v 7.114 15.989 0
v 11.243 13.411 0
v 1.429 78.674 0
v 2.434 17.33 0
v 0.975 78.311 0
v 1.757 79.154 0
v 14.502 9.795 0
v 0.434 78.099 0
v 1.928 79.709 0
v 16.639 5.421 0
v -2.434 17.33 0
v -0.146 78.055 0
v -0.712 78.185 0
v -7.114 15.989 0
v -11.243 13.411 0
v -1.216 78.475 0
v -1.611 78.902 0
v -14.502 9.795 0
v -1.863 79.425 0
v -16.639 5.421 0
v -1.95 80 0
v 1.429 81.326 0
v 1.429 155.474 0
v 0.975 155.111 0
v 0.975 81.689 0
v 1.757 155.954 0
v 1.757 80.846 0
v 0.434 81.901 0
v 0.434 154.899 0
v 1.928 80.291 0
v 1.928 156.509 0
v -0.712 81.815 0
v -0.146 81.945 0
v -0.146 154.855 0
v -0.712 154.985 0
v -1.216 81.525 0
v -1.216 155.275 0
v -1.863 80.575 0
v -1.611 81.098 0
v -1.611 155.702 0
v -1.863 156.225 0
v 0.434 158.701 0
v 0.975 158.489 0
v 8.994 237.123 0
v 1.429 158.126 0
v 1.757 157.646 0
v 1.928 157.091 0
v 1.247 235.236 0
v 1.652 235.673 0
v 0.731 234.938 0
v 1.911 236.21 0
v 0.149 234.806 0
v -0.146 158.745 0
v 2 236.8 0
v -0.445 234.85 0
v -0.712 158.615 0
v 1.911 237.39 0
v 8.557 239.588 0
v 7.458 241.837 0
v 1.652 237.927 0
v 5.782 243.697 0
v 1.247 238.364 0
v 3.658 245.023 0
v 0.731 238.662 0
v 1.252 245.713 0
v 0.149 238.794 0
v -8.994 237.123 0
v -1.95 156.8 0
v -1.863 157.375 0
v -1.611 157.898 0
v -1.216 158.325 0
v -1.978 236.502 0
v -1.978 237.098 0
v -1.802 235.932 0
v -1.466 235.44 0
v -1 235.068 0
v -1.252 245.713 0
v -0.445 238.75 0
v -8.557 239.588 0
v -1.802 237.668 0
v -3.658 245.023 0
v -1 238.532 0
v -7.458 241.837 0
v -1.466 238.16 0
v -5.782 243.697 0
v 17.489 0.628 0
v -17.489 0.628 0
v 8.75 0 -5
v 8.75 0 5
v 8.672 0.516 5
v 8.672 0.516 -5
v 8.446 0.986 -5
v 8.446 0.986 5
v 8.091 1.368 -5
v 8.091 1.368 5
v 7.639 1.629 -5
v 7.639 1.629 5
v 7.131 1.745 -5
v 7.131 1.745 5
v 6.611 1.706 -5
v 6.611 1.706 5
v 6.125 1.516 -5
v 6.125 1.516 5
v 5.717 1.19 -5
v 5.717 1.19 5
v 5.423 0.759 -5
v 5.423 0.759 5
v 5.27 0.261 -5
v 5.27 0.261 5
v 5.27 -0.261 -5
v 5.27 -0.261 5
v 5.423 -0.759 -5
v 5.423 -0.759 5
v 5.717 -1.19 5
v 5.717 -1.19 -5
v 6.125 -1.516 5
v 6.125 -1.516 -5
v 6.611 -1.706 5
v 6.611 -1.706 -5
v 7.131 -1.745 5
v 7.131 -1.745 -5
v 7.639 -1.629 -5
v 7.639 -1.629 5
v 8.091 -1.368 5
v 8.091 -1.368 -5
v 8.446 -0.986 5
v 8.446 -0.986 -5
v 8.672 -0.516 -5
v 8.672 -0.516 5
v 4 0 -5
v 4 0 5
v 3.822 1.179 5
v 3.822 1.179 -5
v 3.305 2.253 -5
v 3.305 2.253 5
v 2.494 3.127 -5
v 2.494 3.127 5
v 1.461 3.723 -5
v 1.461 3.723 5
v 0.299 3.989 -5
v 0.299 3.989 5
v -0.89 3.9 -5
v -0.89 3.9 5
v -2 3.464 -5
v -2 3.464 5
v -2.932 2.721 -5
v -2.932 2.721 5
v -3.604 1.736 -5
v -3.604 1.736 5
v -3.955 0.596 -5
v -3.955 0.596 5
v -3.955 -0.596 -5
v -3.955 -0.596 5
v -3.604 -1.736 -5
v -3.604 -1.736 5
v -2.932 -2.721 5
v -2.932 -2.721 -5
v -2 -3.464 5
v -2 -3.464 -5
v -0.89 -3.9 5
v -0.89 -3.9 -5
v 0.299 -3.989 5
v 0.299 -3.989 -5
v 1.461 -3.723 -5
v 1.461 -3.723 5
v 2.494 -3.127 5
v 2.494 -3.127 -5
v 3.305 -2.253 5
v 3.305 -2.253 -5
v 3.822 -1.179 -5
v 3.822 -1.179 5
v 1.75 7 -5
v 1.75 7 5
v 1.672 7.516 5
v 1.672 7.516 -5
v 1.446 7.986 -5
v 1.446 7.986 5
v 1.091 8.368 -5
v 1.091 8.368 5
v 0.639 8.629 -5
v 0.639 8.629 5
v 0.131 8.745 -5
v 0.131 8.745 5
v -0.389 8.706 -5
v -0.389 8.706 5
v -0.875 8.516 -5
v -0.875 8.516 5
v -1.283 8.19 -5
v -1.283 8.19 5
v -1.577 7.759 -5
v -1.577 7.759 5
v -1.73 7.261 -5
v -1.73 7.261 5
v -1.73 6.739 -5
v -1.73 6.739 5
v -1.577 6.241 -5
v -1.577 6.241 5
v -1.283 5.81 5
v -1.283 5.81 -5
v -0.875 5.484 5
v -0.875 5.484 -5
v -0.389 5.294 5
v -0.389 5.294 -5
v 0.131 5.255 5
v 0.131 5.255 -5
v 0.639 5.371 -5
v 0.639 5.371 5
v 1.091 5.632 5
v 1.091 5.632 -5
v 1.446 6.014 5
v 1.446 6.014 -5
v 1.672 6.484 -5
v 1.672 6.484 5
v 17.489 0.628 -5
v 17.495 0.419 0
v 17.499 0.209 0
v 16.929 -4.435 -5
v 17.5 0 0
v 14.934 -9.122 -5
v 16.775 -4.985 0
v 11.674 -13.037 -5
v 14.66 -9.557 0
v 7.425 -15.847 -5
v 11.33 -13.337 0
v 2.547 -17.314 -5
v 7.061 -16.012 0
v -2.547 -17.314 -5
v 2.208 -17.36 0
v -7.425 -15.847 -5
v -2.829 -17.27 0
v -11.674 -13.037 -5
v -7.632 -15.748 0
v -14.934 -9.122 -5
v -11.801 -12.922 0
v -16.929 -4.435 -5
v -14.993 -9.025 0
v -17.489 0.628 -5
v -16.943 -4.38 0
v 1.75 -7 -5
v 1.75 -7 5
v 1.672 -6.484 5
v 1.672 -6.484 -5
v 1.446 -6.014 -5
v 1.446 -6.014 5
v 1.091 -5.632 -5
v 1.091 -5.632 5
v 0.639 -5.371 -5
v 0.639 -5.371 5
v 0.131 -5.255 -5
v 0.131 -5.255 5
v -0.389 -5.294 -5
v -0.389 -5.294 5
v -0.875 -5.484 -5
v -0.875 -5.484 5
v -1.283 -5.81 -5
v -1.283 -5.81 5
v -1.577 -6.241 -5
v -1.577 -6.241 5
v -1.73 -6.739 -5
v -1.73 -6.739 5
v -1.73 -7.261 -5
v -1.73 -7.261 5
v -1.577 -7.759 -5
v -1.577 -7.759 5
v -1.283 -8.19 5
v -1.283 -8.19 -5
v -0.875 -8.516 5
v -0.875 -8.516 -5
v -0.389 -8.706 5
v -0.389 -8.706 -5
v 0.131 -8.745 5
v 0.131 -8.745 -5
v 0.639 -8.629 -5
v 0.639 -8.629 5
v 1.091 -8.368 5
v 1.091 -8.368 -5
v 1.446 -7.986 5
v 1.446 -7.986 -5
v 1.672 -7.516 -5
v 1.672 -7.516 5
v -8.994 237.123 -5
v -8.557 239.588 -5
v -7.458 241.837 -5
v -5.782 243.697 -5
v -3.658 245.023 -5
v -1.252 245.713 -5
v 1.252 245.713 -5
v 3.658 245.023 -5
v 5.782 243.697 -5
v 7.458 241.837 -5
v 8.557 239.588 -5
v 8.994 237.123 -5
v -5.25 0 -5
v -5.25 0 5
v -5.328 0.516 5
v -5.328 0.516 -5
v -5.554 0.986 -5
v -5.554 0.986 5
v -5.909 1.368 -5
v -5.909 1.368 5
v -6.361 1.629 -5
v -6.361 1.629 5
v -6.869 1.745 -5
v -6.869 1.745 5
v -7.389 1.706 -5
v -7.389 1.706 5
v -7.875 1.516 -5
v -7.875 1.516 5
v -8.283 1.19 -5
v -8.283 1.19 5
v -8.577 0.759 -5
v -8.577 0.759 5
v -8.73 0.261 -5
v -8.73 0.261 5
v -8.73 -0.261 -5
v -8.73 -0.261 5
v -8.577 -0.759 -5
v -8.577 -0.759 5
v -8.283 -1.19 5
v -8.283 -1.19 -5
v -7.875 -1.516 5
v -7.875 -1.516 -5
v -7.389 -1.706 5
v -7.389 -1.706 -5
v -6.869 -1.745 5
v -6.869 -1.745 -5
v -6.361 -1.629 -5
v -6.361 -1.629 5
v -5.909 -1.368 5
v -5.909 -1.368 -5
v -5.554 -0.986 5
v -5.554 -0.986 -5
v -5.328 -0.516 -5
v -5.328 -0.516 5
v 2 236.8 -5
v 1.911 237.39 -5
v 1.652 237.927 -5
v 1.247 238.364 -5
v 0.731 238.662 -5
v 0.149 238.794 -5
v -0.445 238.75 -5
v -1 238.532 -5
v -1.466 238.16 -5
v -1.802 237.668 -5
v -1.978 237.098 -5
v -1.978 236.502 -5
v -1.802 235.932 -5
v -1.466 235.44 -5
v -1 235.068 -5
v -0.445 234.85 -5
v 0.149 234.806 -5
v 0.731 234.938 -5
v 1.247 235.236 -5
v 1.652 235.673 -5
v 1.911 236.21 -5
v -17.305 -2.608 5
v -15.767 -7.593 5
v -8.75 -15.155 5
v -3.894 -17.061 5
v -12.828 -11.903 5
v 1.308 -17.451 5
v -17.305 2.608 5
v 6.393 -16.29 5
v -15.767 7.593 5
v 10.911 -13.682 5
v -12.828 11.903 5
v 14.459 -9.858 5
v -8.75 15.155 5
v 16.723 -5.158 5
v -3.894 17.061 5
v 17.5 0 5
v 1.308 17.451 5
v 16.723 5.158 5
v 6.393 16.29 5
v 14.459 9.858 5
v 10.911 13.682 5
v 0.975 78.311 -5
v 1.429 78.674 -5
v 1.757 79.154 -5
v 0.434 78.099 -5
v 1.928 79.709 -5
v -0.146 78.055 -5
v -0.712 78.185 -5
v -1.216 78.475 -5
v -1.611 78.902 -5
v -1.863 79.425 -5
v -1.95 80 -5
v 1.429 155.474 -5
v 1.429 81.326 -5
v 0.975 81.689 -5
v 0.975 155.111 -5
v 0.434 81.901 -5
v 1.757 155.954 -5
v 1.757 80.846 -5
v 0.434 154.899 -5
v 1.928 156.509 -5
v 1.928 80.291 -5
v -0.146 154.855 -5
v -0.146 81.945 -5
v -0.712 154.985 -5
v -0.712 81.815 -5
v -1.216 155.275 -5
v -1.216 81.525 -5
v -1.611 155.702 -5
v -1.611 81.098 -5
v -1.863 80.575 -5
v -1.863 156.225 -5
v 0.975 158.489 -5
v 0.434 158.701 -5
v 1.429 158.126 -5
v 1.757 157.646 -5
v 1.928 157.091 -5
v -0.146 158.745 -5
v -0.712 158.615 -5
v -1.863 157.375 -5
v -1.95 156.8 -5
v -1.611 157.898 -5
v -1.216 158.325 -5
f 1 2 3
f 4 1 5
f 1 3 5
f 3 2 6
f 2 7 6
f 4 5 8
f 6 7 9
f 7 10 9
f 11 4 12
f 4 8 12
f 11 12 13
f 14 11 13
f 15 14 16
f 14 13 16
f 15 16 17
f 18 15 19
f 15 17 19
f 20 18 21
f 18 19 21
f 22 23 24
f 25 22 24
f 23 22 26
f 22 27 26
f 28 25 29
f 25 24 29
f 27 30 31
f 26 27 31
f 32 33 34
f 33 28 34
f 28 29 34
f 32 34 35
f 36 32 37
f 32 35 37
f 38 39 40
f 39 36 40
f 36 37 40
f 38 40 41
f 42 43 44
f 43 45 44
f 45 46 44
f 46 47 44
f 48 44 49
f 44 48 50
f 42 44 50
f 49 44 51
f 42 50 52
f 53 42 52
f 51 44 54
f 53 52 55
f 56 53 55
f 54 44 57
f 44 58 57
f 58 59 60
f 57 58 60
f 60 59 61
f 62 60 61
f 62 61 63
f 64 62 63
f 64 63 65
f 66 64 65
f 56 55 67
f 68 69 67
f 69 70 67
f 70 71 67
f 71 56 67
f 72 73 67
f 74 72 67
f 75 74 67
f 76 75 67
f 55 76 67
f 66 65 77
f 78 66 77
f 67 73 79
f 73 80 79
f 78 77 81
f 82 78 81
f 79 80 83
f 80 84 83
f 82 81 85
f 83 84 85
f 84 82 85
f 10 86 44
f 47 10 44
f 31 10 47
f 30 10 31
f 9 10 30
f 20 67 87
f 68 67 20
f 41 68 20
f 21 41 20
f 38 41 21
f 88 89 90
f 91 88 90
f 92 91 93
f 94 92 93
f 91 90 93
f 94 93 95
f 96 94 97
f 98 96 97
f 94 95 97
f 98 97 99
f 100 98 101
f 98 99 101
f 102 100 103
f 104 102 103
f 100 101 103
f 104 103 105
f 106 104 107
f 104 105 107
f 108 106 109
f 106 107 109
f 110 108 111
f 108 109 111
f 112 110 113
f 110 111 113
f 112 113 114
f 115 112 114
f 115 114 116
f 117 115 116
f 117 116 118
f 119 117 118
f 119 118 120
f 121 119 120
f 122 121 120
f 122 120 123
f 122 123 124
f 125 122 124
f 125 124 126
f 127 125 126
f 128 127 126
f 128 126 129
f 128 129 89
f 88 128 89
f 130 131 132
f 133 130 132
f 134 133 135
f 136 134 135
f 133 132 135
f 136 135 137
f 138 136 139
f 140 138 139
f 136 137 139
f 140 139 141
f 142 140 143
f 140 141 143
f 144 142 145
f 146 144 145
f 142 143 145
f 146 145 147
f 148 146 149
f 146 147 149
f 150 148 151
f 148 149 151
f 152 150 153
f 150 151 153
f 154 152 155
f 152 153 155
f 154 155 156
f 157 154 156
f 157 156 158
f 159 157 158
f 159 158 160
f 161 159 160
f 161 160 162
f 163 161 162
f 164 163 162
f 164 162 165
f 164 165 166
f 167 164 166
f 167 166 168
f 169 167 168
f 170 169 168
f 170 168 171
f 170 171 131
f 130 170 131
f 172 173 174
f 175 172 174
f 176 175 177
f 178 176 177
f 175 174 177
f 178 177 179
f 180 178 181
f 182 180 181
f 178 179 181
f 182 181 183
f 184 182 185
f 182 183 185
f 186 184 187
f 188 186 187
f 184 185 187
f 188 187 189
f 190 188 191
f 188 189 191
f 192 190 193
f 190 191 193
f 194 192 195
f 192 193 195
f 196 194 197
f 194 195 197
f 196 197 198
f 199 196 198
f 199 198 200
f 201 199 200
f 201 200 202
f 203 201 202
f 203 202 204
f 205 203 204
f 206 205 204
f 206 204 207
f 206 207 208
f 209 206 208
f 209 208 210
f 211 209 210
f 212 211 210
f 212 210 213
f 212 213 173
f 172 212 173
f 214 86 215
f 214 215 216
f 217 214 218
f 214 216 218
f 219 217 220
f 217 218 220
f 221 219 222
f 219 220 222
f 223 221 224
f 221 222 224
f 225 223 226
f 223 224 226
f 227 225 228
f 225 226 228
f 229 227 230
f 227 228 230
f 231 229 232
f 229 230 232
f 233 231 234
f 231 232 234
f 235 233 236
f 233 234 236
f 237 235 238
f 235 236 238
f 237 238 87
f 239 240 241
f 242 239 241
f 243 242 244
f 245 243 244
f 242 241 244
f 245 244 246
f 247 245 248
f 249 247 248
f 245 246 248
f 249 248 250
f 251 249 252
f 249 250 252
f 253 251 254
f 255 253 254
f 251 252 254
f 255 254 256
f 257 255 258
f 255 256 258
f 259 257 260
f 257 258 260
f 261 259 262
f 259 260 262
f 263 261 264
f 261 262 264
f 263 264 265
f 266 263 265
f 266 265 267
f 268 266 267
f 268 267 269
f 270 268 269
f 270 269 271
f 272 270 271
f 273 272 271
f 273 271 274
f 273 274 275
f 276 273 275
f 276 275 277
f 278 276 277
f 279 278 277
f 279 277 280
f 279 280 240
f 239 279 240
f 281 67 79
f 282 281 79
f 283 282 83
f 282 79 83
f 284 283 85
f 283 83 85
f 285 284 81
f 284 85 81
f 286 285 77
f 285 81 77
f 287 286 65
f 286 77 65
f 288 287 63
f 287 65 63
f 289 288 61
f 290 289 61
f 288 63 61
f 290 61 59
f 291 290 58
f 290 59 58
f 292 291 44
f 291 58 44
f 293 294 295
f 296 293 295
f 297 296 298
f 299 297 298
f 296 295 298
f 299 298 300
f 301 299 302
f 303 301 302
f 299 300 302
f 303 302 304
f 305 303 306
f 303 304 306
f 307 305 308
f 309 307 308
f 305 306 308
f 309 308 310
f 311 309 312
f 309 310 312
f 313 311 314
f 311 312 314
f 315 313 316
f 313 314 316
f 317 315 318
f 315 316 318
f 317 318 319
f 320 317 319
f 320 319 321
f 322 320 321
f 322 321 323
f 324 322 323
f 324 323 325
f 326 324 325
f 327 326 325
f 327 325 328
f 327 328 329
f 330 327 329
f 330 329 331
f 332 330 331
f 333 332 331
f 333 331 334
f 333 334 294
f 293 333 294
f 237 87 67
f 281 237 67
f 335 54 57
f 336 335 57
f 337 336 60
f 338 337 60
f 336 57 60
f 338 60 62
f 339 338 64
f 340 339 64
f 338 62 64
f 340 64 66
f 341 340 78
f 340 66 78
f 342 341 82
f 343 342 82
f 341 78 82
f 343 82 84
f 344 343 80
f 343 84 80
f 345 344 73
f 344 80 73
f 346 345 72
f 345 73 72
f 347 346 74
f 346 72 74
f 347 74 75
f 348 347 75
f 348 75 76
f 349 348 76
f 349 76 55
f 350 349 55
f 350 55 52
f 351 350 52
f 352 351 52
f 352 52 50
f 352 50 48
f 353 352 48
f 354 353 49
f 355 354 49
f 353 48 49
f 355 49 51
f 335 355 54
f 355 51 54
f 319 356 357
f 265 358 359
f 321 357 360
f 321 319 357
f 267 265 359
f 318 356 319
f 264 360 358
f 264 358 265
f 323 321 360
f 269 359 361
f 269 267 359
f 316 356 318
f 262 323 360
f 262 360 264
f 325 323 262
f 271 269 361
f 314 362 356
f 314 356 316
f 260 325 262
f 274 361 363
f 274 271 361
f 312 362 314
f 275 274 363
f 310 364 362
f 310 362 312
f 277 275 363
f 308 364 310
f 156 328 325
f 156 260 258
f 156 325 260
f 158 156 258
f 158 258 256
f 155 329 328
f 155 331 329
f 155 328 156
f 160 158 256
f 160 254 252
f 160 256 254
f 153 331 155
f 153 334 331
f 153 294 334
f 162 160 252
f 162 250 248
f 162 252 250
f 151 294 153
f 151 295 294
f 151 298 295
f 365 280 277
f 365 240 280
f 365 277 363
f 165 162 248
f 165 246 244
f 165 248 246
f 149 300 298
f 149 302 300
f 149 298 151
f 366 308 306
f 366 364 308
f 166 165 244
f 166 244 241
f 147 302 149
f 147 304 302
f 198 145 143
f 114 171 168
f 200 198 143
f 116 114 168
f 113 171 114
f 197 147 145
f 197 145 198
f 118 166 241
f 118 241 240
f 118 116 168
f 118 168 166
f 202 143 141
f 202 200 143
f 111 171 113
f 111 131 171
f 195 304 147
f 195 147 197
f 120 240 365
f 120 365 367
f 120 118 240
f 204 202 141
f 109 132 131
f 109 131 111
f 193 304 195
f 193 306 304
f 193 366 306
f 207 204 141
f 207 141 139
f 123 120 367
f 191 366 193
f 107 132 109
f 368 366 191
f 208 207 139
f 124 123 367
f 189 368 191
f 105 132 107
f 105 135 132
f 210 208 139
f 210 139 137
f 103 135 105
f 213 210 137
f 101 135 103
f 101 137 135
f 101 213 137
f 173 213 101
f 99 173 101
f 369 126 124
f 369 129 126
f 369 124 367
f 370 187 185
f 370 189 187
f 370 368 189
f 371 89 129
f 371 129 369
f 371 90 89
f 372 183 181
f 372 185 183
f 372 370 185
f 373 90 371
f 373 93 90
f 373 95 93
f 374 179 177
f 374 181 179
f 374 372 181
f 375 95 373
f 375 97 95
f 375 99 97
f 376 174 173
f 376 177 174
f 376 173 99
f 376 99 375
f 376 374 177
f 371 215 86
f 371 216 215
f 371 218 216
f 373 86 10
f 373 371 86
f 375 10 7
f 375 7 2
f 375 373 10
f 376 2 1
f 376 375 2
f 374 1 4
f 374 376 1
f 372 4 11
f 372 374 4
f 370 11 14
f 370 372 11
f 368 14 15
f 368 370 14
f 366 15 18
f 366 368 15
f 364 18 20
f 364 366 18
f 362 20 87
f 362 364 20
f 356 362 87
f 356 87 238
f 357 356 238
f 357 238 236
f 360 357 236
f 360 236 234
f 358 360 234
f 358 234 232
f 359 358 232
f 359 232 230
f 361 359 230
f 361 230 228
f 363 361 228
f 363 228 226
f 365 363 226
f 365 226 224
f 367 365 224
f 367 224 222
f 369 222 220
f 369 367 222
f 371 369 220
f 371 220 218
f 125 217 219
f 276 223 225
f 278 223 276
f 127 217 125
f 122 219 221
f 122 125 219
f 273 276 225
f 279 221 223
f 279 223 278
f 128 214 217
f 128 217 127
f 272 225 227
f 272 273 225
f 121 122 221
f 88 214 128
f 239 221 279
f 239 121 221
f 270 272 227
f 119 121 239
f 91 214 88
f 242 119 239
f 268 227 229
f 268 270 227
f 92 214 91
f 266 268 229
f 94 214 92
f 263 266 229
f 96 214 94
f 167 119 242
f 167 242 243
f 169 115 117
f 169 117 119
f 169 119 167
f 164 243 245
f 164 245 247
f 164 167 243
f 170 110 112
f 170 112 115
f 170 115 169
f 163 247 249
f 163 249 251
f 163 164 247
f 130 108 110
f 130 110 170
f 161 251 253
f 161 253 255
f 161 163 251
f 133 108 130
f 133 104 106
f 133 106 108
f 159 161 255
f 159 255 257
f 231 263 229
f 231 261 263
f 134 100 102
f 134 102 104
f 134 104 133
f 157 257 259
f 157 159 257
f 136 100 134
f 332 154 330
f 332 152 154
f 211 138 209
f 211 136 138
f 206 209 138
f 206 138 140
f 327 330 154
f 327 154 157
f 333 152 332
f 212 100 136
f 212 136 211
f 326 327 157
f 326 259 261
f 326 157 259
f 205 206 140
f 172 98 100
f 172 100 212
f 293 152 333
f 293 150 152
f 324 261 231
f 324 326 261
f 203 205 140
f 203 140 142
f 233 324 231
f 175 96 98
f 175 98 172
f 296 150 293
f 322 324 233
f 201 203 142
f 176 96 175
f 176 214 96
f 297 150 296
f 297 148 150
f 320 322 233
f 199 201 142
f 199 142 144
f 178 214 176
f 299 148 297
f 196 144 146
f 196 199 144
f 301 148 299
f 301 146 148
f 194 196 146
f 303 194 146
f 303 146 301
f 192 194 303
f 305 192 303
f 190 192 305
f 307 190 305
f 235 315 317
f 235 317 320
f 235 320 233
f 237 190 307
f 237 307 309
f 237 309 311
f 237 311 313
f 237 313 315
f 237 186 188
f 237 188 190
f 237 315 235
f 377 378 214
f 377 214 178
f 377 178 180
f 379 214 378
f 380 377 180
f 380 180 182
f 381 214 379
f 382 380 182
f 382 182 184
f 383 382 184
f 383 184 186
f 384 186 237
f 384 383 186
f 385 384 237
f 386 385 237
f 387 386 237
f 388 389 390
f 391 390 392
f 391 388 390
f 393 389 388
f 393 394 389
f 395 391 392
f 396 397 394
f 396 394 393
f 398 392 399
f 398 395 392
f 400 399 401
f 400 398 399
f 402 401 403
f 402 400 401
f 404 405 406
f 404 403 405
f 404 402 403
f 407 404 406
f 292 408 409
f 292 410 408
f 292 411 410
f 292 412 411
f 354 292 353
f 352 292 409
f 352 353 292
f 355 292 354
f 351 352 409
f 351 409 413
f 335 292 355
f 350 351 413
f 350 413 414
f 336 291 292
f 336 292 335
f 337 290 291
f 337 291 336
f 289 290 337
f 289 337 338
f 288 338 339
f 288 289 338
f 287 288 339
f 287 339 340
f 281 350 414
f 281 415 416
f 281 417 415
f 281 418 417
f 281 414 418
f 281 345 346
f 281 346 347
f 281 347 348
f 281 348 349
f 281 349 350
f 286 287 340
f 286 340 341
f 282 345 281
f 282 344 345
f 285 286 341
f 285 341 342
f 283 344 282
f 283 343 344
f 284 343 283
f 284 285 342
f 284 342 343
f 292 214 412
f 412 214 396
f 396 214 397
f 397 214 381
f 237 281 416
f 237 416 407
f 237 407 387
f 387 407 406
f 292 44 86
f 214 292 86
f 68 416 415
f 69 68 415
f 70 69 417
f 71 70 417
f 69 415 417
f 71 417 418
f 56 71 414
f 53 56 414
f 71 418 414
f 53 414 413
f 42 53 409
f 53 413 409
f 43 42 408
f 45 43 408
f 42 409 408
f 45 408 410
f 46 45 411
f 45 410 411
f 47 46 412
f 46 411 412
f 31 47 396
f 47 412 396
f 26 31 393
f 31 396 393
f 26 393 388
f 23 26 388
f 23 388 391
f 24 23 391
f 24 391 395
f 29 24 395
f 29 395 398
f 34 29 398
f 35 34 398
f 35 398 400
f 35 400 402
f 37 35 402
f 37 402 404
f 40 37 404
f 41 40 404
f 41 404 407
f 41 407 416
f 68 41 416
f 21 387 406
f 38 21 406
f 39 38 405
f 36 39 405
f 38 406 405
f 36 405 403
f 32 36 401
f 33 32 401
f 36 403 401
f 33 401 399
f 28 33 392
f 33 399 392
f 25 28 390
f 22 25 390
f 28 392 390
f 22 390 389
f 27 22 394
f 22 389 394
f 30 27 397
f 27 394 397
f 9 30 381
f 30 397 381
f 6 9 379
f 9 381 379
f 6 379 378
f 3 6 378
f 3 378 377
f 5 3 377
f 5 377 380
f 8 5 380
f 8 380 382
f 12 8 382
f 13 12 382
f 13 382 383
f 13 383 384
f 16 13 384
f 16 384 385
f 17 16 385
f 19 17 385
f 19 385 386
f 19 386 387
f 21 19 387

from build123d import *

# Parameters (mm, degrees)
SKETCH7_R                = 4
SKETCH7_R_2              = 2
BOSS_EXTRUDE1_DEPTH      = 5
HOLE_WIZARD_M3_5_1_D     = 3.9
HOLE_WIZARD_M3_5_1_DEPTH = 10
HOLE_WIZARD_M3_5_1_TIP   = 1.171678207
SKETCH_4_R               = 1.75
CUT_EXTRUDE_1_DEPTH      = 10
EXTRUDE_START            = 5
SKETCH_5_R               = 17.5
SKETCH_5_R_2             = 1.75
SKETCH_5_R_3             = 4
EXTRUDE_1_DEPTH          = 5


with BuildPart() as part:
    # Sketch7 → Boss-Extrude1 (new body)
    with BuildSketch(Plane.XY):
        with BuildLine():
            Line((8.994200014, 237.123057432), (17.48872225, 0.62816723))
            ThreePointArc((17.48872225, 0.62816723), (0, -17.5), (-17.48872225, 0.62816723))
            Line((-17.48872225, 0.62816723), (-8.994200014, 237.123057432))
            ThreePointArc((-8.994200014, 237.123057432), (0, 245.8), (8.994200014, 237.123057432))
        make_face()
        Circle(SKETCH7_R, mode=Mode.SUBTRACT)
        with Locations((0, 236.8)):
            Circle(SKETCH7_R_2, mode=Mode.SUBTRACT)
    extrude(amount=-BOSS_EXTRUDE1_DEPTH)

    # M3.5 间隙孔1
    with Locations(Plane(origin=(0, 156.8, 0), x_dir=(1, 0, 0), z_dir=(0, 0, 1))):
        with Locations((0, 0), (0, -76.8)):
            Hole(HOLE_WIZARD_M3_5_1_D / 2, depth=HOLE_WIZARD_M3_5_1_DEPTH)
            with Locations((0, 0, -(HOLE_WIZARD_M3_5_1_DEPTH + HOLE_WIZARD_M3_5_1_TIP / 2))):  # 118° drill point
                Cone(0, HOLE_WIZARD_M3_5_1_D / 2, HOLE_WIZARD_M3_5_1_TIP, mode=Mode.SUBTRACT)

    # 草图4 → 切除-拉伸1 (cut)
    with BuildSketch(Plane.XY):
        with Locations((7, 0)):
            Circle(SKETCH_4_R)
        with Locations((0, 7)):
            Circle(SKETCH_4_R)
        with Locations((0, -7)):
            Circle(SKETCH_4_R)
        with Locations((-7, 0)):
            Circle(SKETCH_4_R)
    extrude(amount=-CUT_EXTRUDE_1_DEPTH, mode=Mode.SUBTRACT)

    # 草图5 → 凸台-拉伸1 (add)
    with BuildSketch(Plane.XY.offset(EXTRUDE_START)):
        Circle(SKETCH_5_R)
        with Locations((7, 0)):
            Circle(SKETCH_5_R_2, mode=Mode.SUBTRACT)
        with Locations((0, -7)):
            Circle(SKETCH_5_R_2, mode=Mode.SUBTRACT)
        Circle(SKETCH_5_R_3, mode=Mode.SUBTRACT)
        with Locations((-7, 0)):
            Circle(SKETCH_5_R_2, mode=Mode.SUBTRACT)
        with Locations((0, 7)):
            Circle(SKETCH_5_R_2, mode=Mode.SUBTRACT)
    extrude(amount=-EXTRUDE_1_DEPTH)


solid = part.part
